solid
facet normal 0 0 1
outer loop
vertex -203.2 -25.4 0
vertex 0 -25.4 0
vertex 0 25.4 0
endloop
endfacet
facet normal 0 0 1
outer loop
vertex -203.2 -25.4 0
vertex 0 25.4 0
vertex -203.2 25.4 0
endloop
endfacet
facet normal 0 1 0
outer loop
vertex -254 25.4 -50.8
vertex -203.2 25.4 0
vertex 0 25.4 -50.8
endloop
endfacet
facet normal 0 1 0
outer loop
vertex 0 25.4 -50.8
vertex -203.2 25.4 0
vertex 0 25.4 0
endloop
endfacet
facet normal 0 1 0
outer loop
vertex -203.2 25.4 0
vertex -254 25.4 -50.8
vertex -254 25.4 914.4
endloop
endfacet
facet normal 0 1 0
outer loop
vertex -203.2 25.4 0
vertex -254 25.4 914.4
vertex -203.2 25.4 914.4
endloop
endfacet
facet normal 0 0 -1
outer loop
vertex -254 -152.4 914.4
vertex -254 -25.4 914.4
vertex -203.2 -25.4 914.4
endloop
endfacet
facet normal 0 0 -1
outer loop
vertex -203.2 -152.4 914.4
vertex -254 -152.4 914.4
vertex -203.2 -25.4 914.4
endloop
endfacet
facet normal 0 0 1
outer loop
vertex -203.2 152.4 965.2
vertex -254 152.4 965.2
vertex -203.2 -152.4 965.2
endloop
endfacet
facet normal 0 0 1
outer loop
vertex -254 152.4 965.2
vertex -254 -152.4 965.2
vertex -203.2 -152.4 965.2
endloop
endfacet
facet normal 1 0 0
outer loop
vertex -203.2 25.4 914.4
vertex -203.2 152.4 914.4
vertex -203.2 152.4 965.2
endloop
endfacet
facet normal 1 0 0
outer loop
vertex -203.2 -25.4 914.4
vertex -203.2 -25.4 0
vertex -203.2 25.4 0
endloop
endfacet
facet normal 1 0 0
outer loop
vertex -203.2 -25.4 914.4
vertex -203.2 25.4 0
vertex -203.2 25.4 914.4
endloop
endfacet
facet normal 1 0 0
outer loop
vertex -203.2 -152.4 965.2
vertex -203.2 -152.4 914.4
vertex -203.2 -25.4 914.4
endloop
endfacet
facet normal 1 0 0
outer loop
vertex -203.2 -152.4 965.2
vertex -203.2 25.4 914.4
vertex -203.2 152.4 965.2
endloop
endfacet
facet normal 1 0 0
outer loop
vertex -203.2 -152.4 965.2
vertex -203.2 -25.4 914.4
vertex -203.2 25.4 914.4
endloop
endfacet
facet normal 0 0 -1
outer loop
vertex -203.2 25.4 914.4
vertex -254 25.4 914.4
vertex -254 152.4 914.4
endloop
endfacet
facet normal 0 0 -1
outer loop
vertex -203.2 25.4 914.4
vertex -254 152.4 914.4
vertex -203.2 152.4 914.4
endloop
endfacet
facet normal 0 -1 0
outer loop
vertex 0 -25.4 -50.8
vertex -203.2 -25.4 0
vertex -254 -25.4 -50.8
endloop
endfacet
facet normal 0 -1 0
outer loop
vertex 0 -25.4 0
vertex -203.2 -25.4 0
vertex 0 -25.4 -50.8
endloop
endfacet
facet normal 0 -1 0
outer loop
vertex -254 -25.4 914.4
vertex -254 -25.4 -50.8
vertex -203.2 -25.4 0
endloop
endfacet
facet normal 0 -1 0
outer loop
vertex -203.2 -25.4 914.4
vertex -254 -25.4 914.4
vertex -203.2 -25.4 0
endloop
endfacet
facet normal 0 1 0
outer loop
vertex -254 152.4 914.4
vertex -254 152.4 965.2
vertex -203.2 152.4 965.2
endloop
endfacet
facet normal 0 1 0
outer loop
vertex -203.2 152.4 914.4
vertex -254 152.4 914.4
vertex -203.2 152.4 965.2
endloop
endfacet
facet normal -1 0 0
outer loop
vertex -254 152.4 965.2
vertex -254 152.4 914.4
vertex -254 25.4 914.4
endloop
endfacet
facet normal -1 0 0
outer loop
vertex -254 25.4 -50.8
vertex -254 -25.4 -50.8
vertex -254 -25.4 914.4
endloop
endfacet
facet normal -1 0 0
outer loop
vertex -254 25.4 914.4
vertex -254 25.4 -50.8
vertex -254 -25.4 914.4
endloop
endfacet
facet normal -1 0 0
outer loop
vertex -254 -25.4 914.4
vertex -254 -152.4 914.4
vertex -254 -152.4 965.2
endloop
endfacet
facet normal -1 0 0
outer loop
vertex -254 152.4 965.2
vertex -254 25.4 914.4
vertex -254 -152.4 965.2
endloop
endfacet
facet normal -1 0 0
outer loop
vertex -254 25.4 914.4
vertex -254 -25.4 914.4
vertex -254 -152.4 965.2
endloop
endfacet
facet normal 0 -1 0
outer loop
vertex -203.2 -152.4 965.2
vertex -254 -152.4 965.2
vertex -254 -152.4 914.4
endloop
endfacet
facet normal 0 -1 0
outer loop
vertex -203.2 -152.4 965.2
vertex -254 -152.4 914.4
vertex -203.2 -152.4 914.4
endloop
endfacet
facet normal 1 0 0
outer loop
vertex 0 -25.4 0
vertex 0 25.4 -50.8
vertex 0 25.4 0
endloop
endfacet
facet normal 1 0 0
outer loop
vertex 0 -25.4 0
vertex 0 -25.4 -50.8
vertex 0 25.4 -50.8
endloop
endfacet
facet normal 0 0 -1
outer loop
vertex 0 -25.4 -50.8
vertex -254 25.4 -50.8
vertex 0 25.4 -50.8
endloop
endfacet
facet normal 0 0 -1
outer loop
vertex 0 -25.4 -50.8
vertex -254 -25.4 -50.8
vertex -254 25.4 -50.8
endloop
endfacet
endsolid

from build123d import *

# Parameters (mm, degrees)
F1_DEPTH = 25.4
F2_W     = 50.8
F2_H     = 50.8
F3_DEPTH = 127


# Not quite as in the source:
# - a feature of the source that left no trace in its solid (it failed there, or was rolled back) is left out
# - the program builds the solid bodies; features that only make, move or delete a surface that nothing else refers to are left out


with BuildPart() as f1:
    # F0 (on Front) → F1 (new body, symmetric)
    with BuildSketch(Plane.XZ):
        Polygon((0, -50.8), (0, 0), (-203.2, 0), (-203.2, 965.2), (-254, 965.2), (-254, -50.8), align=None)
    extrude(amount=F1_DEPTH, both=True)

    # F2 (on face) → F3 (join)
    with BuildSketch(Plane.XZ.offset(25.4)):
        with Locations((-228.6, 939.8)):
            Rectangle(F2_W, F2_H)
    extrude(amount=F3_DEPTH)

    # F4: F1 across plane


with BuildPart() as f1_1:
    add(f1.part)
    add(f1.part.mirror(Plane.XZ))


solid = f1_1.part
